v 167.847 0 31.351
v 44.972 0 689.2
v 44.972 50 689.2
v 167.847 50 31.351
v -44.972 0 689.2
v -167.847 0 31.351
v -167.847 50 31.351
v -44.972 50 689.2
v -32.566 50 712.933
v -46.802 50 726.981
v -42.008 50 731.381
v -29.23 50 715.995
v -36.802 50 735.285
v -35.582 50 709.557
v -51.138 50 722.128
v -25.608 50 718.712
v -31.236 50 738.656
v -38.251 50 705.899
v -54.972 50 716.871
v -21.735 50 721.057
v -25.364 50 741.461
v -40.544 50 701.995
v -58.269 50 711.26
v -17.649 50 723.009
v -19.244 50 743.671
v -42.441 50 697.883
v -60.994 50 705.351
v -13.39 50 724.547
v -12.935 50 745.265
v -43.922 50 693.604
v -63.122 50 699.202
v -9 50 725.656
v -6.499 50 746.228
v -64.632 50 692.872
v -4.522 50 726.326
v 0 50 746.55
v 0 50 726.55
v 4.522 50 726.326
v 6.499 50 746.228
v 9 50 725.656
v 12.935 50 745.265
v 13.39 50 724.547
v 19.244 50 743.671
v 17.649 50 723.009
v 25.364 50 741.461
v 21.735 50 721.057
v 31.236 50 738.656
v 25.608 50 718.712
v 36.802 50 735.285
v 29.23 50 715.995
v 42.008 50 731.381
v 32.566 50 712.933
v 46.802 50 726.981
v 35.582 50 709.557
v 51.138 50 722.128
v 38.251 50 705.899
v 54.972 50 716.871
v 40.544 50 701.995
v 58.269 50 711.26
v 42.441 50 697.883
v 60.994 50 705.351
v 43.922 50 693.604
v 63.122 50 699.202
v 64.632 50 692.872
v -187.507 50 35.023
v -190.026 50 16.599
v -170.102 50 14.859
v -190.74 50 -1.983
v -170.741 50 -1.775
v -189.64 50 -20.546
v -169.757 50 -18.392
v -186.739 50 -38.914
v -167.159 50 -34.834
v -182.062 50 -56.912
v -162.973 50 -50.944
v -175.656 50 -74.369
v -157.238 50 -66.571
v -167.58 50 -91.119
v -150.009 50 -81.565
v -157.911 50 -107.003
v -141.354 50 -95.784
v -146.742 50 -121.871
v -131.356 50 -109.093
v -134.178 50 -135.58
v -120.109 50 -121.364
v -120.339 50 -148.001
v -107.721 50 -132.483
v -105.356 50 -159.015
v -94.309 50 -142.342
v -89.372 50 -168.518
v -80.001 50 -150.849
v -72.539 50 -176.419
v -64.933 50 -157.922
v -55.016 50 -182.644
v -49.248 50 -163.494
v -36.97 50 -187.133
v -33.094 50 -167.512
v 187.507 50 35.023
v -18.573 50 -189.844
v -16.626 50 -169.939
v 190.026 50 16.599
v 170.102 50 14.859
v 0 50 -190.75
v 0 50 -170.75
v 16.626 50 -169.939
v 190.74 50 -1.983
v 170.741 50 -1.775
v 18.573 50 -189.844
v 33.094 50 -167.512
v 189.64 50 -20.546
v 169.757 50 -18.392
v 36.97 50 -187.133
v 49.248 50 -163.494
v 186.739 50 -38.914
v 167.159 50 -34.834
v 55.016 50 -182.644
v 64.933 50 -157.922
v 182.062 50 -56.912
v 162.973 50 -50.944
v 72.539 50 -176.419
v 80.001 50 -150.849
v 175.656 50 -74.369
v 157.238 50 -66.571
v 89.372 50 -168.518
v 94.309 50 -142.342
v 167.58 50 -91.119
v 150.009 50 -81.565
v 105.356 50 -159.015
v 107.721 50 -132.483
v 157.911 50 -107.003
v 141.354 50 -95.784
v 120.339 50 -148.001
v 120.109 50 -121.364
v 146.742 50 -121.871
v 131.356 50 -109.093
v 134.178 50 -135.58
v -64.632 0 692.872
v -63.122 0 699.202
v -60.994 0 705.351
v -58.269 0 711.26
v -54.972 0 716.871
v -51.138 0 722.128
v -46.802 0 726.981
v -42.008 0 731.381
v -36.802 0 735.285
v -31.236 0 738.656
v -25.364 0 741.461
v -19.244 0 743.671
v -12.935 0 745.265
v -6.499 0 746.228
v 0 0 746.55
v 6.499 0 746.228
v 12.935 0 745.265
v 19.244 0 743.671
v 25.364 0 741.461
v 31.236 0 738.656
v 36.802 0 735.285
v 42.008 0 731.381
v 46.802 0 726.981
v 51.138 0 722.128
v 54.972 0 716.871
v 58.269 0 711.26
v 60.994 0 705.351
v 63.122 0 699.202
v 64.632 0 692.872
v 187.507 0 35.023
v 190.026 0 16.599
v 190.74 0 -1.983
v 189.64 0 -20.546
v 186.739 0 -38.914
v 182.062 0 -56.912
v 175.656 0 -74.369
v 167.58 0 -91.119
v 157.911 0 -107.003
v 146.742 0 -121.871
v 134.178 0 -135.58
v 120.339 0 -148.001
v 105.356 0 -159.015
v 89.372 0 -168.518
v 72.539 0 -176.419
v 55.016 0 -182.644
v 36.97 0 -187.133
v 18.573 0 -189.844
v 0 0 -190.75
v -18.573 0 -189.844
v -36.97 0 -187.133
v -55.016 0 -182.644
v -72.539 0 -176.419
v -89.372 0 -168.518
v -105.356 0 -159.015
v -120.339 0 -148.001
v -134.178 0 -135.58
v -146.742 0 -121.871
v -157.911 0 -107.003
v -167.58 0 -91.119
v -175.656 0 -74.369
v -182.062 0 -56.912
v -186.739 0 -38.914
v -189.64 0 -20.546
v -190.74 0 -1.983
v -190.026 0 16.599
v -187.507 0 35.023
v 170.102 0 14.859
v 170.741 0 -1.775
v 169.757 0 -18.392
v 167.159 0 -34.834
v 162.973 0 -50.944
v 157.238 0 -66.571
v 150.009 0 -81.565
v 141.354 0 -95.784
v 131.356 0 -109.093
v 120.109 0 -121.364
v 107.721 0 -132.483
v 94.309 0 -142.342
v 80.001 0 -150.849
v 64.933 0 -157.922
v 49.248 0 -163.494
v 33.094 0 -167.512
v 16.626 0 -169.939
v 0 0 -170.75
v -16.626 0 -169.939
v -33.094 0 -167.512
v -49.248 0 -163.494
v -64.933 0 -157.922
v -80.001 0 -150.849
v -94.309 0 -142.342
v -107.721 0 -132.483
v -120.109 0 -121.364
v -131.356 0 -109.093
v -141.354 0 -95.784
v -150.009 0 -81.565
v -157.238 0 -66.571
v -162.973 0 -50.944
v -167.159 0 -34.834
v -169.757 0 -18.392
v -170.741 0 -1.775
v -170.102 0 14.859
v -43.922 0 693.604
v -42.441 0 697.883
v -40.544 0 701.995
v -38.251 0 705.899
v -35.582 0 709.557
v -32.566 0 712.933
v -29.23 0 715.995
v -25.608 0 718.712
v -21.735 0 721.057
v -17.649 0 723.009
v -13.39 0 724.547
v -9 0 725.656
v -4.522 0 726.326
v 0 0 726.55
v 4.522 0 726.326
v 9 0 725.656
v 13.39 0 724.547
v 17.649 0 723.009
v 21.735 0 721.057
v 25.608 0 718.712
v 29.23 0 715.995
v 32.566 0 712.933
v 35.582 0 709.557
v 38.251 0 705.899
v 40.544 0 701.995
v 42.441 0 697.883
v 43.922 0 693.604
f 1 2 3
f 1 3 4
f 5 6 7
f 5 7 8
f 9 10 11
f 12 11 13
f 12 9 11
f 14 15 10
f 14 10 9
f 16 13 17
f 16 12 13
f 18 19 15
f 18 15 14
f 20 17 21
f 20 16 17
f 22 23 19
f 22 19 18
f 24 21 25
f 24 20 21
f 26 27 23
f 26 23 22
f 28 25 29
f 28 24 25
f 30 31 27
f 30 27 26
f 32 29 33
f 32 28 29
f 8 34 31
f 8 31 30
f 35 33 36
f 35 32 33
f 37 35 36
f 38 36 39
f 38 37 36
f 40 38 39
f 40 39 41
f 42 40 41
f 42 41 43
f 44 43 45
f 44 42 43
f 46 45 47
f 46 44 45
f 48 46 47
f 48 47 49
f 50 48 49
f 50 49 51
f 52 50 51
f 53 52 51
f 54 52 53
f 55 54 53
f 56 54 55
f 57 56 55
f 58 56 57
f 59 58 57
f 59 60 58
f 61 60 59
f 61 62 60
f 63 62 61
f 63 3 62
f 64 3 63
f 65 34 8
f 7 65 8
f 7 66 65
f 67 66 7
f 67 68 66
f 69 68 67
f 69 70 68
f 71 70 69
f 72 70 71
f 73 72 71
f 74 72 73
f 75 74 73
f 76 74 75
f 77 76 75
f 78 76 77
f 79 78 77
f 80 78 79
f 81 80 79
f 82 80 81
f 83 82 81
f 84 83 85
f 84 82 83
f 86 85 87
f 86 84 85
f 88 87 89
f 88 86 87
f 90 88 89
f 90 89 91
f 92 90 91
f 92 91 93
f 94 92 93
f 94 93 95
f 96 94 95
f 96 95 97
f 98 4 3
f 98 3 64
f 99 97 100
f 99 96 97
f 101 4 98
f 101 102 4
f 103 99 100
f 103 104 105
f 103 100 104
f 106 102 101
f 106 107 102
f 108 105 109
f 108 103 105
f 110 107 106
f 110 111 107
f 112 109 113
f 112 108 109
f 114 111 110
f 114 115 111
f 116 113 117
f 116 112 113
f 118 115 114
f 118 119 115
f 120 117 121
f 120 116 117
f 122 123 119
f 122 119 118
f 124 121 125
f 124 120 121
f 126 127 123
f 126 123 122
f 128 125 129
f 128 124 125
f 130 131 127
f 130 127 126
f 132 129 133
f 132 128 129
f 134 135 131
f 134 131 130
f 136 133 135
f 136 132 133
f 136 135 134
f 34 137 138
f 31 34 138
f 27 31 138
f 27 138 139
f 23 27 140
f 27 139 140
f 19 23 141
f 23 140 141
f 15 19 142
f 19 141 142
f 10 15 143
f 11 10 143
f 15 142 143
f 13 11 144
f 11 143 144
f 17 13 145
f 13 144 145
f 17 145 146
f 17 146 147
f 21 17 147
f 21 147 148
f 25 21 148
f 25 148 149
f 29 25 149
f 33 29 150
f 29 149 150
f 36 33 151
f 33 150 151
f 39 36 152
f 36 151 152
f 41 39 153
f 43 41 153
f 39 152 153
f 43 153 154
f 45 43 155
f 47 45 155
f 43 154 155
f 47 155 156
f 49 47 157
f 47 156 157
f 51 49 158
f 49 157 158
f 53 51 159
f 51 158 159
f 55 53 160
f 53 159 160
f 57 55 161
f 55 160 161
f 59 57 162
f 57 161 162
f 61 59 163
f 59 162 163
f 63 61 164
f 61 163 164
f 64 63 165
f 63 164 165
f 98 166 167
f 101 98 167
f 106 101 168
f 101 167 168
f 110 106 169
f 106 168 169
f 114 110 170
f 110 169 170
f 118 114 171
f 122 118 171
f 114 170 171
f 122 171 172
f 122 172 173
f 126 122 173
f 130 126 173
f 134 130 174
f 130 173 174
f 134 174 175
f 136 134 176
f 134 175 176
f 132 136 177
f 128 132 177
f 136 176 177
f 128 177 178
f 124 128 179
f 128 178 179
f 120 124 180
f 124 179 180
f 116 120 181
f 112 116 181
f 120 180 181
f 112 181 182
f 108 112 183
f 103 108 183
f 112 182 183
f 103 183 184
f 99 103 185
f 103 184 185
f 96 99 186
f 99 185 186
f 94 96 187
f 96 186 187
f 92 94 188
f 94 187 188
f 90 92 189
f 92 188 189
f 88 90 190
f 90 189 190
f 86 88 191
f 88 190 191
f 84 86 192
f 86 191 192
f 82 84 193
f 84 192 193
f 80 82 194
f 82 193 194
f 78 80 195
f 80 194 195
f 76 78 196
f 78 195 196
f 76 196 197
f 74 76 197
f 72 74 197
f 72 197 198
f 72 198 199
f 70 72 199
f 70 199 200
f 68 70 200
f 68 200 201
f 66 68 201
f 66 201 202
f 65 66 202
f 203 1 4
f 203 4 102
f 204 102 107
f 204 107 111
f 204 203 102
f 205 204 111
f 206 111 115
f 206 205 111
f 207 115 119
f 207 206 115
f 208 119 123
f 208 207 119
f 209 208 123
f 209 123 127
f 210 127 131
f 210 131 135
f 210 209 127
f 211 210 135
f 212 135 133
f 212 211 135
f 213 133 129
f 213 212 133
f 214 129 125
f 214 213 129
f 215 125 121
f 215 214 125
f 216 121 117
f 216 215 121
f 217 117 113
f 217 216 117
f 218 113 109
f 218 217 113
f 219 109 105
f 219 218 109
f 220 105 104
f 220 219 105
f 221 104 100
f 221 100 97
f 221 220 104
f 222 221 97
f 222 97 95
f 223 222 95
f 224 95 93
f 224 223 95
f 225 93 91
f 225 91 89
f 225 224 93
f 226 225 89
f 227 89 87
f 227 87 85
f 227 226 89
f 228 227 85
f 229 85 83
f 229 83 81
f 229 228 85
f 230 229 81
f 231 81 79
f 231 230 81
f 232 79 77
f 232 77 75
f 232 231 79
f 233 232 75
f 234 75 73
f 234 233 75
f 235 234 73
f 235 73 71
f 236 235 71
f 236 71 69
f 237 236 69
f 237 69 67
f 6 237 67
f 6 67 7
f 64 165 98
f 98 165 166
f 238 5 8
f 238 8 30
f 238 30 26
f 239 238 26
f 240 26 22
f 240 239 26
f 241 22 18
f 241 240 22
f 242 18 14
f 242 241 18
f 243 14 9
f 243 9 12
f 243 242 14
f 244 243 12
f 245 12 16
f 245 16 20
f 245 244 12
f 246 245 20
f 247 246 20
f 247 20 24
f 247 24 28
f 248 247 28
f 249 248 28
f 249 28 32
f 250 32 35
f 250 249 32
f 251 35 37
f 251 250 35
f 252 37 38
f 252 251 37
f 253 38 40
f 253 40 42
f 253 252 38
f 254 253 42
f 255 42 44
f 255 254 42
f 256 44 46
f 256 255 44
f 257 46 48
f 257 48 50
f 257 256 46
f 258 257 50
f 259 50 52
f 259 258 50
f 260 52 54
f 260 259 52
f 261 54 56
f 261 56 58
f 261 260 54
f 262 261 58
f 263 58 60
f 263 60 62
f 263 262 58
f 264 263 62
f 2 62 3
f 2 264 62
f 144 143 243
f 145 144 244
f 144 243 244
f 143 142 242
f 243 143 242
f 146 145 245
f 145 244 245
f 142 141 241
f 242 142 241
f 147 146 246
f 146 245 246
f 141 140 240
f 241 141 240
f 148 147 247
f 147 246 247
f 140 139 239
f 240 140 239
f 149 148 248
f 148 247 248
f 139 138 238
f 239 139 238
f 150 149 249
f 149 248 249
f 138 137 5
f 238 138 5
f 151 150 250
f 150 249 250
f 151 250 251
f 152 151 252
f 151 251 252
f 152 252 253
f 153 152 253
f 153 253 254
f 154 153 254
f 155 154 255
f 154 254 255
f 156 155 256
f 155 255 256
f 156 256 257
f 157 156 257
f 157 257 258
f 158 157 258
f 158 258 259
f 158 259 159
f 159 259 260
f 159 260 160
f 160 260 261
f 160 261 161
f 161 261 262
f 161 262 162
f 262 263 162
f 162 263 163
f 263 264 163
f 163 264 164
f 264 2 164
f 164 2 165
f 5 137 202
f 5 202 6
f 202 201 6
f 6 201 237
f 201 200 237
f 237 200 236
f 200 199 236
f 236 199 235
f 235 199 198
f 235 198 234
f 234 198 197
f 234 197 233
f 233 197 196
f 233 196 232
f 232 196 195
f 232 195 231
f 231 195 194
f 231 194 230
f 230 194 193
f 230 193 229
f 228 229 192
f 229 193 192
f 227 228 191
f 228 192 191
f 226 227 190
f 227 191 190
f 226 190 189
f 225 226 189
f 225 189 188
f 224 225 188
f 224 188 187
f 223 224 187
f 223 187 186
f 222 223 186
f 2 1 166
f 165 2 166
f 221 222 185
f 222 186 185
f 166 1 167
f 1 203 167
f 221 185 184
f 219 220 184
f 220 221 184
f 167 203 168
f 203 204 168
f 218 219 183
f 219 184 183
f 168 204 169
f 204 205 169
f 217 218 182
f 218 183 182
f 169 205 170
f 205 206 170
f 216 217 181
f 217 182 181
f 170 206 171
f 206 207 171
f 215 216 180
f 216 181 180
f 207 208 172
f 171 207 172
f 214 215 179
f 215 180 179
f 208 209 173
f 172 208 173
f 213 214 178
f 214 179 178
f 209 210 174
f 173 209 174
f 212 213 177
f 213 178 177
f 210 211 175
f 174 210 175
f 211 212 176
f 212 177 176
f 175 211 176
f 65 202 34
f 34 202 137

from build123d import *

# Parameters (mm, degrees)
BOSS_EXTRUDE1_DEPTH = 50


with BuildPart() as part:
    # Sketch1 → Boss-Extrude1 (new body)
    with BuildSketch(Plane(origin=(0, 0, 0), x_dir=(1, 0, 0), z_dir=(0, 1, 0))):
        with BuildLine():
            Line((-187.507179986, -35.023134548), (-64.632225867, -692.872194477))
            ThreePointArc((-64.632225867, -692.872194477), (0, -746.55), (64.632225867, -692.872194477))
            Line((64.632225867, -692.872194477), (187.507179986, -35.023134548))
            ThreePointArc((187.507179986, -35.023134548), (0, 190.75), (-187.507179986, -35.023134548))
        make_face()
        with BuildLine():
            ThreePointArc((-44.972233208, -689.200044066), (0, -726.55), (44.972233208, -689.200044066))
            Line((44.972233208, -689.200044066), (167.847187327, -31.350984136))
            ThreePointArc((167.847187327, -31.350984136), (0, 170.75), (-167.847187327, -31.350984136))
            Line((-167.847187327, -31.350984136), (-44.972233208, -689.200044066))
        make_face(mode=Mode.SUBTRACT)
    extrude(amount=BOSS_EXTRUDE1_DEPTH)


solid = part.part
